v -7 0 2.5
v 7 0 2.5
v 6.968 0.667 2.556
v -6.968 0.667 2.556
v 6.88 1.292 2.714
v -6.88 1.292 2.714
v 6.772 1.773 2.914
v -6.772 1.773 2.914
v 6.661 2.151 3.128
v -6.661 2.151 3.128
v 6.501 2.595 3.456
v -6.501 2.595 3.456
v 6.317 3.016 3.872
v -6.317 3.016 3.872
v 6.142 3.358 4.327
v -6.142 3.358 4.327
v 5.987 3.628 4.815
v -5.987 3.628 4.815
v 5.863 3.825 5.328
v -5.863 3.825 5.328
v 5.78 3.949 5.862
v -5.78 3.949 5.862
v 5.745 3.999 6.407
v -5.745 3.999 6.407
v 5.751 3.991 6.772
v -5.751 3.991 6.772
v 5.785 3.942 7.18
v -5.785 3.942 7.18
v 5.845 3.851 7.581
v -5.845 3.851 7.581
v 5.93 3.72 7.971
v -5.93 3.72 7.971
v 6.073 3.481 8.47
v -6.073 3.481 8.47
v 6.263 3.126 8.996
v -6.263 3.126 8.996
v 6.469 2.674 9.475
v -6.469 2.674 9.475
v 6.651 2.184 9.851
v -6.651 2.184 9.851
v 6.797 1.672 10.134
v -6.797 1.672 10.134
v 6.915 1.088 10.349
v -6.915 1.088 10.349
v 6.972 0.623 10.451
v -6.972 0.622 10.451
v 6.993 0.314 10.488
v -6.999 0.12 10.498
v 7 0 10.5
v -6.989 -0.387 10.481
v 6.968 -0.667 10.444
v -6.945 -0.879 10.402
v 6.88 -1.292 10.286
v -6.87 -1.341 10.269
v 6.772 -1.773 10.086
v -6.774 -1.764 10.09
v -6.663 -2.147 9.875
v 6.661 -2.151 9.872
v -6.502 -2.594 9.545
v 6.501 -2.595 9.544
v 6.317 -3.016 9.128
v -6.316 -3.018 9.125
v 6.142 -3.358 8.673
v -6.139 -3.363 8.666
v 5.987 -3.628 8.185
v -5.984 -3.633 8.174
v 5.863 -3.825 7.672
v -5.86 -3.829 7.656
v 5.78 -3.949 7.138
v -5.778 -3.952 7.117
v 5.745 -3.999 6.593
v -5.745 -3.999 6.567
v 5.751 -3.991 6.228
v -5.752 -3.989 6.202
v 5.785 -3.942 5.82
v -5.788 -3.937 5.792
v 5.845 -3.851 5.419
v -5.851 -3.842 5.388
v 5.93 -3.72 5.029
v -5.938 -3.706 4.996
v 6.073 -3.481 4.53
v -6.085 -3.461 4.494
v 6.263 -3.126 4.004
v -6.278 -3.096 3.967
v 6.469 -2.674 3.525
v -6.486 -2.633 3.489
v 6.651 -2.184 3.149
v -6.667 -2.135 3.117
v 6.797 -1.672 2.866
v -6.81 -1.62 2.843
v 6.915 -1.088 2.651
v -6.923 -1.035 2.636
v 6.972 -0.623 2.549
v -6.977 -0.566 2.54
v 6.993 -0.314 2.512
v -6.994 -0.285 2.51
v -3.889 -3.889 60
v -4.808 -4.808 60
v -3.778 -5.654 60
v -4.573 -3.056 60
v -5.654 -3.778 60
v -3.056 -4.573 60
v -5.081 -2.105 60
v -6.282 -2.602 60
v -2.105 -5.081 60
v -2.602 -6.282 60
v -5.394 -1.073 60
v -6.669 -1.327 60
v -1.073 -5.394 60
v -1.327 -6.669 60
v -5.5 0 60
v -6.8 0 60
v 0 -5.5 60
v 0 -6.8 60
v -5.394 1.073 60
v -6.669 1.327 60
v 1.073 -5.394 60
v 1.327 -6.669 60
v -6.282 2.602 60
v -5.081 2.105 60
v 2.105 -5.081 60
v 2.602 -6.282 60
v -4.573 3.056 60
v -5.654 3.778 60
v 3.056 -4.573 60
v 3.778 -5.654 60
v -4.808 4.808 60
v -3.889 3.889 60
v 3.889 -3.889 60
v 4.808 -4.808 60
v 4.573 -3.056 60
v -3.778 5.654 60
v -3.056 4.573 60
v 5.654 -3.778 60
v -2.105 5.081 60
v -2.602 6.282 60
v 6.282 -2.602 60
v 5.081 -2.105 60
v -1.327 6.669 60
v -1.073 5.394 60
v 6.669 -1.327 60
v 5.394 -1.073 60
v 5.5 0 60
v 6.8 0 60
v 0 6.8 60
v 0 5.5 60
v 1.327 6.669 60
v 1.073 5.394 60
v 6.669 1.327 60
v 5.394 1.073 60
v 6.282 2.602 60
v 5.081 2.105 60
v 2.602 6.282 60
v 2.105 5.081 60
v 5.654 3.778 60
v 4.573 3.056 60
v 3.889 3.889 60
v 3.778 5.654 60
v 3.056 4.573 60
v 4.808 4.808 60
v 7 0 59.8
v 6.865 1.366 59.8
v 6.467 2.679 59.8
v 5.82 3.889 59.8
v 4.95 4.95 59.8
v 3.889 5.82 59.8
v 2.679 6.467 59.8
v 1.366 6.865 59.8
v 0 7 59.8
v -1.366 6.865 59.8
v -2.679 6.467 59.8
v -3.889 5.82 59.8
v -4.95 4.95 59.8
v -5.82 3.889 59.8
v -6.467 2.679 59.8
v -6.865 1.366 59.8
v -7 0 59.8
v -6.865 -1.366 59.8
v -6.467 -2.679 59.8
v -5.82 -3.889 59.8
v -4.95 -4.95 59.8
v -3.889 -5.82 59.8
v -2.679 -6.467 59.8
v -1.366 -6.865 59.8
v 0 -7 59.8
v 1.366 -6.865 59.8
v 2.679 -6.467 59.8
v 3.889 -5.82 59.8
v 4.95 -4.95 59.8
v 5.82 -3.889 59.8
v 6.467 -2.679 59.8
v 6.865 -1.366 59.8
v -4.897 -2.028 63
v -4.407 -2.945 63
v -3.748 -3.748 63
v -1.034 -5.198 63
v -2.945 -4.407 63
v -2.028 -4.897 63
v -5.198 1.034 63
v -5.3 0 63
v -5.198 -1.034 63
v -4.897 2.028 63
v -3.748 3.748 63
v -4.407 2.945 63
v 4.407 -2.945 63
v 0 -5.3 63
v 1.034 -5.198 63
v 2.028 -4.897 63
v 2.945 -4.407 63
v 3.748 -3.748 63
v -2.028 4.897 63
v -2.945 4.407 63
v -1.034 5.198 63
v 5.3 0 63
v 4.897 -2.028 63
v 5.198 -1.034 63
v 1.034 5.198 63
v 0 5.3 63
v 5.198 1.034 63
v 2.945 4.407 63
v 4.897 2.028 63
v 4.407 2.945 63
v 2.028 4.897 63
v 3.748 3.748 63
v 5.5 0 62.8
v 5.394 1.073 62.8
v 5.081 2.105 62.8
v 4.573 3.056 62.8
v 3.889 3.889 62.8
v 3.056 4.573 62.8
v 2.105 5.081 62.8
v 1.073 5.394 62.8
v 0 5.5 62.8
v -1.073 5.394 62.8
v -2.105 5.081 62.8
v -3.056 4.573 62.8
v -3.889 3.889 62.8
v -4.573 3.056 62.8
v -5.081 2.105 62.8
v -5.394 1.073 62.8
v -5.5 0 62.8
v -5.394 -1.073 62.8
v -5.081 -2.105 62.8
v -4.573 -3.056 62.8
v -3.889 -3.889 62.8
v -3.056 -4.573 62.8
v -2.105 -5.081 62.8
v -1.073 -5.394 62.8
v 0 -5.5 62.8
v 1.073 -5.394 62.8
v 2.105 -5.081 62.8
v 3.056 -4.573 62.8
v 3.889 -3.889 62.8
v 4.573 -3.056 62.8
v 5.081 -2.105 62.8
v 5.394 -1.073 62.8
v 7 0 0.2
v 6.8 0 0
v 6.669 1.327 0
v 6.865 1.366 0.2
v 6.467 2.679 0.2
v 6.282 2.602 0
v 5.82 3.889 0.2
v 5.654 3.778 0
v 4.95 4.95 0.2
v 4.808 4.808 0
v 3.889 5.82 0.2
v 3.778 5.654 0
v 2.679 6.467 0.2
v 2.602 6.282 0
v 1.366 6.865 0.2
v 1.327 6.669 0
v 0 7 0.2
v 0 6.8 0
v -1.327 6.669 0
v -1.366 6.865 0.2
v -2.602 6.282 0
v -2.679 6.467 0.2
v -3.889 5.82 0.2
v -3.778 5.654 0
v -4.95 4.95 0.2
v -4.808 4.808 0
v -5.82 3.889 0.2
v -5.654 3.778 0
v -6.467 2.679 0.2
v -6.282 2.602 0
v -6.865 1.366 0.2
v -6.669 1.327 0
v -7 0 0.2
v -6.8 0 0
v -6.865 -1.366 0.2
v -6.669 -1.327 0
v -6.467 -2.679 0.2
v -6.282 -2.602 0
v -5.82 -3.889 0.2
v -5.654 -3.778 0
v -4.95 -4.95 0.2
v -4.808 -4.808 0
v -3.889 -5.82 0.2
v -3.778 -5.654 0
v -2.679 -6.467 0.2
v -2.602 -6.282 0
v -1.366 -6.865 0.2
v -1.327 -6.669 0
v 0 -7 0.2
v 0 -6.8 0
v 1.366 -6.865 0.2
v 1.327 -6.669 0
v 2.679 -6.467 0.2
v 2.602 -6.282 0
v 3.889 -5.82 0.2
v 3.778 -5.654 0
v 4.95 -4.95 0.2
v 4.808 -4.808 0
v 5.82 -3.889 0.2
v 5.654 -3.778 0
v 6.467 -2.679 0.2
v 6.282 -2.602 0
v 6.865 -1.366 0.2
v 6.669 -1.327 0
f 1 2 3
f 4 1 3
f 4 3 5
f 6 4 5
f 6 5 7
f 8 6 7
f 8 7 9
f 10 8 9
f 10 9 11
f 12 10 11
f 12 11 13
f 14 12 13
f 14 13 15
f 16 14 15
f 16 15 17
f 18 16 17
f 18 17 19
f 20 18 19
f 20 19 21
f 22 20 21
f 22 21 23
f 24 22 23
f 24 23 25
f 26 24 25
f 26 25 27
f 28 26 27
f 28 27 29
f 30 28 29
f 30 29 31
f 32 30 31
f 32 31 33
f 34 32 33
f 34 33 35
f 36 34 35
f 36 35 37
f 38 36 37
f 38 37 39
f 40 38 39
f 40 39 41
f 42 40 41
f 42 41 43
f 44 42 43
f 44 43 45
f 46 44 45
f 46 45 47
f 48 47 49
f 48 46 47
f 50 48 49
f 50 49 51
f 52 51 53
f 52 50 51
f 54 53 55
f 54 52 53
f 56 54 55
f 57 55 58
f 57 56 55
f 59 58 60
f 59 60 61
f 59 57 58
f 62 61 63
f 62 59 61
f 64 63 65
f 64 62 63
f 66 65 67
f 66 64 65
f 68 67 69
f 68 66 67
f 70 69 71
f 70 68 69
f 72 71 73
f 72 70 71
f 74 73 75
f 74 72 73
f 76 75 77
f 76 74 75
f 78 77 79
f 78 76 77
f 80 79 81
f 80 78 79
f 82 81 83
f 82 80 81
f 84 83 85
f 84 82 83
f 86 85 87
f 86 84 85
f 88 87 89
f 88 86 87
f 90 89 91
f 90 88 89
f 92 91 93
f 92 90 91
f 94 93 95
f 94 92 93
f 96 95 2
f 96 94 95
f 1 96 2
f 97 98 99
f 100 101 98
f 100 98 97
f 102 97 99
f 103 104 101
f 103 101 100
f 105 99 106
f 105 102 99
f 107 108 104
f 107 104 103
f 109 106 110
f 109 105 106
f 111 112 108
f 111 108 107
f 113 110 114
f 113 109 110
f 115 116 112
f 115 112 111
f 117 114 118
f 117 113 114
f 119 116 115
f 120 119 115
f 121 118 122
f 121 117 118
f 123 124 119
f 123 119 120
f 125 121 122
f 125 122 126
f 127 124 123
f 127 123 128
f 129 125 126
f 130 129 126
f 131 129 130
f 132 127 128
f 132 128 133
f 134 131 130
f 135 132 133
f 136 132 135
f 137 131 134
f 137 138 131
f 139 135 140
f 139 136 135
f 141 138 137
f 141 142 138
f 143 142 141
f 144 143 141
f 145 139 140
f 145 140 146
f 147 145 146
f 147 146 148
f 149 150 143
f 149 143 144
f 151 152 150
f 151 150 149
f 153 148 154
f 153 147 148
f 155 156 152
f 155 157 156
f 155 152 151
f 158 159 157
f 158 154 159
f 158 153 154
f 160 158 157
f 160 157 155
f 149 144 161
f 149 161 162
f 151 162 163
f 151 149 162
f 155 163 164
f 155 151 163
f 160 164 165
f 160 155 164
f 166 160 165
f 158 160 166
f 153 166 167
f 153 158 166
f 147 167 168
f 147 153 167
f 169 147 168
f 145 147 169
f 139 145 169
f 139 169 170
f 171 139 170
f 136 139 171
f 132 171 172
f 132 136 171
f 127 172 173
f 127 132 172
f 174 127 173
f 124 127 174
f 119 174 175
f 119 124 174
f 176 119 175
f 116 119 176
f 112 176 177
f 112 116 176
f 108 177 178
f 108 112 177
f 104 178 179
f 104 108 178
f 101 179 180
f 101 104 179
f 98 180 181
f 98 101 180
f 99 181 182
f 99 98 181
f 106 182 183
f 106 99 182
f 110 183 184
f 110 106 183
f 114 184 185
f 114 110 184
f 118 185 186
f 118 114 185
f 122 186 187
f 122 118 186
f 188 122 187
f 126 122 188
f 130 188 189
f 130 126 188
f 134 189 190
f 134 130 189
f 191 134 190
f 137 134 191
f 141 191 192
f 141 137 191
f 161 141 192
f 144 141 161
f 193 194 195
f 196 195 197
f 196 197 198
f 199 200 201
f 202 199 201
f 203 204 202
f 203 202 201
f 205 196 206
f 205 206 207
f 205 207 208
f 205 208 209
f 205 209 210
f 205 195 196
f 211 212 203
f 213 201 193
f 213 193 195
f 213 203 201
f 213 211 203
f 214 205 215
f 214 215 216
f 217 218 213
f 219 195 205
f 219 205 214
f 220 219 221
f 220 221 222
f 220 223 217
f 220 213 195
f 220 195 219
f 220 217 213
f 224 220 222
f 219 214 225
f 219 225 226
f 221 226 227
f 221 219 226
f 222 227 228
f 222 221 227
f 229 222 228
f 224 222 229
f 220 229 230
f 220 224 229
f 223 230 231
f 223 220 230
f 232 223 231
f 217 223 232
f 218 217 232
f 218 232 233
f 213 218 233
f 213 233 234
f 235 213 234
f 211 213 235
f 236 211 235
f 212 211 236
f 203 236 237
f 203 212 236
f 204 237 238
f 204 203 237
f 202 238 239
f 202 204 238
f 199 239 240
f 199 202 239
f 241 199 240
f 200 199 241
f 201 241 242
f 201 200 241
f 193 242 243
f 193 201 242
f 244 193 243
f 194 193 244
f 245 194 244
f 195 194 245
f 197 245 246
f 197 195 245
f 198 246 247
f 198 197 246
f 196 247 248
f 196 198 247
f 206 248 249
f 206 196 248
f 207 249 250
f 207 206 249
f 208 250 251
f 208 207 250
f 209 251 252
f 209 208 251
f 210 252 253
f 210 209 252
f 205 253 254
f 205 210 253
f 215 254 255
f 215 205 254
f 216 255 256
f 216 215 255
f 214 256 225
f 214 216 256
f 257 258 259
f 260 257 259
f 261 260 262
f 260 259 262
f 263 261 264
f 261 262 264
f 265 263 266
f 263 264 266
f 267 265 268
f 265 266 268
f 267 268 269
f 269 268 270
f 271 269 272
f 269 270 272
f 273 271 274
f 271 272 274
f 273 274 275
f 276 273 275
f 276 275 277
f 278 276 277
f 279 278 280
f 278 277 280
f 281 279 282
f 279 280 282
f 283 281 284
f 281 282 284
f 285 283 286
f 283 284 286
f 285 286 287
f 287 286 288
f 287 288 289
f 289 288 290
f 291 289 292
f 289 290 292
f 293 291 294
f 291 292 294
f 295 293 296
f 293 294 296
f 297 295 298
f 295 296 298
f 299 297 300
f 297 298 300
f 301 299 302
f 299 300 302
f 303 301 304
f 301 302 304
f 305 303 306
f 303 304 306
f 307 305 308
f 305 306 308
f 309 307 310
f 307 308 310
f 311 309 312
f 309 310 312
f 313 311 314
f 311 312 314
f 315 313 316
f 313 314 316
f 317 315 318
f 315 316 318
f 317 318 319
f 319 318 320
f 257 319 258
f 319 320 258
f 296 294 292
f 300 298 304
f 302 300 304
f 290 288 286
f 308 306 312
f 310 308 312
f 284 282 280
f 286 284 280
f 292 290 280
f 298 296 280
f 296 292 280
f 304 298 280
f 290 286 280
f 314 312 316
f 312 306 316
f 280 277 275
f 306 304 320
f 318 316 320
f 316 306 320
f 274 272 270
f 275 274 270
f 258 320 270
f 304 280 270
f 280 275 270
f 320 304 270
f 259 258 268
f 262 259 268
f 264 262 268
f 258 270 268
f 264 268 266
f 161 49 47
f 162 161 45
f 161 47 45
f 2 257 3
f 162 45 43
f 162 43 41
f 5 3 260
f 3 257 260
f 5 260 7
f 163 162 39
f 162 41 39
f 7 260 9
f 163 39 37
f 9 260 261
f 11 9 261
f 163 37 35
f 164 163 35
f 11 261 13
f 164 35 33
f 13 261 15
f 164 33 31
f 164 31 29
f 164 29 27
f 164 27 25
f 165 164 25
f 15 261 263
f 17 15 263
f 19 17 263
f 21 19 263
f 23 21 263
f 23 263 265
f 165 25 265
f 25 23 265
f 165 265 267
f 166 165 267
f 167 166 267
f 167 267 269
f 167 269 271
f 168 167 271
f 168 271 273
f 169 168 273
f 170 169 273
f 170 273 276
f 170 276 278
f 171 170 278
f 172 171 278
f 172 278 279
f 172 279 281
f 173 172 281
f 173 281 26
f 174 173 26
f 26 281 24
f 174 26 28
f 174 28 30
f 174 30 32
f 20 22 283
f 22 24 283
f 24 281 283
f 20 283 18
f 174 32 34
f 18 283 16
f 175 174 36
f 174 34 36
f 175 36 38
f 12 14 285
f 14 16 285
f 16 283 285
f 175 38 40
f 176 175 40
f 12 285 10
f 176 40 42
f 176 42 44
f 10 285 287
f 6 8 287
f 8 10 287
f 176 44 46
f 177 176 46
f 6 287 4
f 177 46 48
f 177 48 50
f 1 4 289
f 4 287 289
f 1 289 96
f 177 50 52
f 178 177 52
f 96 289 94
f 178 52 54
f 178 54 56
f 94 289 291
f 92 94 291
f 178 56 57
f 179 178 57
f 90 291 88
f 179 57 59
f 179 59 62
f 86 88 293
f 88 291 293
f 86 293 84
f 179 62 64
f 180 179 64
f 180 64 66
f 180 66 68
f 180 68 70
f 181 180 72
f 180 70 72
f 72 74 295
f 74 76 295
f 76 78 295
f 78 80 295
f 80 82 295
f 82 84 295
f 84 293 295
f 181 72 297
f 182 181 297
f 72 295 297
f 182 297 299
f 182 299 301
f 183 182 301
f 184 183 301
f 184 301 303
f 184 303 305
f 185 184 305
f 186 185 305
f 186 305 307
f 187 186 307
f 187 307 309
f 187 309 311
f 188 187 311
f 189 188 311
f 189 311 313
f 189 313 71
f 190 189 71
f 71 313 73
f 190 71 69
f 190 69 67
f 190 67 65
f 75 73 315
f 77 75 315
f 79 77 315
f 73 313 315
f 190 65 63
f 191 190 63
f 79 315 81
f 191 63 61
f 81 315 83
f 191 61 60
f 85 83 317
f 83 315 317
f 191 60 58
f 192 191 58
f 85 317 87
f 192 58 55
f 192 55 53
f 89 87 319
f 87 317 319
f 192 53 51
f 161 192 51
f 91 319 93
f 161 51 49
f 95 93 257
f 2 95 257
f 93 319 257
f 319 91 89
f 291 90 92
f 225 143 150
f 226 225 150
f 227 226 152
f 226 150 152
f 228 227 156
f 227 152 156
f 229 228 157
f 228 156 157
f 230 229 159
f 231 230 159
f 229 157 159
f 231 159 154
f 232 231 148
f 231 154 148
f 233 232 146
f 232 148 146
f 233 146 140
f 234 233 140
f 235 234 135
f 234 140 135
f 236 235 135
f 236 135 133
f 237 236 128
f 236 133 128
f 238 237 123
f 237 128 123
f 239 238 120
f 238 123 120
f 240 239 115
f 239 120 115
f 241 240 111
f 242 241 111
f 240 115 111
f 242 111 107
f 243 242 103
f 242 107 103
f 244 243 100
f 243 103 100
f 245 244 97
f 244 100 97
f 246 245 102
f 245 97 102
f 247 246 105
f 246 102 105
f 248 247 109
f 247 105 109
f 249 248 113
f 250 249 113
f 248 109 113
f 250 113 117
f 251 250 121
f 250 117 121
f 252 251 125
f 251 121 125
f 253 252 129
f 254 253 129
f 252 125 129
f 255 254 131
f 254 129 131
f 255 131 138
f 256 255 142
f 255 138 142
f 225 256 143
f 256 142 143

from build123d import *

# Parameters (mm, degrees)
SKIZZE1_R                            = 7
AUFSATZ_LINEAR_AUSTRAGEN1_DEPTH      = 60
SKIZZE2_R                            = 5.5
AUFSATZ_LINEAR_AUSTRAGEN2_DEPTH      = 3
SCHNITT_LINEAR_AUSTRAGEN2_DEPTH      = 64.773035054
SCHNITT_LINEAR_AUSTRAGEN2_DEPTH_BACK = 64.773035054
SKIZZE4_R                            = 4
FASE1_SIZE                           = 0.2


with BuildPart() as part:
    # Skizze1 → Aufsatz-Linear austragen1 (new body)
    with BuildSketch(Plane.XY):
        Circle(SKIZZE1_R)
    extrude(amount=AUFSATZ_LINEAR_AUSTRAGEN1_DEPTH)

    # Skizze2 → Aufsatz-Linear austragen2 (add)
    with BuildSketch(Plane.XY.offset(60)):
        Circle(SKIZZE2_R)
    extrude(amount=AUFSATZ_LINEAR_AUSTRAGEN2_DEPTH)

    # Skizze4 → Schnitt-Linear austragen2 (cut, two sides: drawn at the far end of the back side and taken through both)
    with BuildSketch(Plane(origin=(0, 0, 0), x_dir=(0, 0, -1), z_dir=(1, 0, 0)).offset(-SCHNITT_LINEAR_AUSTRAGEN2_DEPTH_BACK)):
        with Locations((-6.5, 0)):
            Circle(SKIZZE4_R)
    extrude(amount=SCHNITT_LINEAR_AUSTRAGEN2_DEPTH + SCHNITT_LINEAR_AUSTRAGEN2_DEPTH_BACK, mode=Mode.SUBTRACT)

    # Fase1
    fase1_edges = [part.edges().sort_by_distance(p)[0] for p in [
        (-7, 0, 0),
        (-7, 0, 60),
        (-5.5, 0, 63),
    ]]
    chamfer(fase1_edges, length=FASE1_SIZE)


solid = part.part
